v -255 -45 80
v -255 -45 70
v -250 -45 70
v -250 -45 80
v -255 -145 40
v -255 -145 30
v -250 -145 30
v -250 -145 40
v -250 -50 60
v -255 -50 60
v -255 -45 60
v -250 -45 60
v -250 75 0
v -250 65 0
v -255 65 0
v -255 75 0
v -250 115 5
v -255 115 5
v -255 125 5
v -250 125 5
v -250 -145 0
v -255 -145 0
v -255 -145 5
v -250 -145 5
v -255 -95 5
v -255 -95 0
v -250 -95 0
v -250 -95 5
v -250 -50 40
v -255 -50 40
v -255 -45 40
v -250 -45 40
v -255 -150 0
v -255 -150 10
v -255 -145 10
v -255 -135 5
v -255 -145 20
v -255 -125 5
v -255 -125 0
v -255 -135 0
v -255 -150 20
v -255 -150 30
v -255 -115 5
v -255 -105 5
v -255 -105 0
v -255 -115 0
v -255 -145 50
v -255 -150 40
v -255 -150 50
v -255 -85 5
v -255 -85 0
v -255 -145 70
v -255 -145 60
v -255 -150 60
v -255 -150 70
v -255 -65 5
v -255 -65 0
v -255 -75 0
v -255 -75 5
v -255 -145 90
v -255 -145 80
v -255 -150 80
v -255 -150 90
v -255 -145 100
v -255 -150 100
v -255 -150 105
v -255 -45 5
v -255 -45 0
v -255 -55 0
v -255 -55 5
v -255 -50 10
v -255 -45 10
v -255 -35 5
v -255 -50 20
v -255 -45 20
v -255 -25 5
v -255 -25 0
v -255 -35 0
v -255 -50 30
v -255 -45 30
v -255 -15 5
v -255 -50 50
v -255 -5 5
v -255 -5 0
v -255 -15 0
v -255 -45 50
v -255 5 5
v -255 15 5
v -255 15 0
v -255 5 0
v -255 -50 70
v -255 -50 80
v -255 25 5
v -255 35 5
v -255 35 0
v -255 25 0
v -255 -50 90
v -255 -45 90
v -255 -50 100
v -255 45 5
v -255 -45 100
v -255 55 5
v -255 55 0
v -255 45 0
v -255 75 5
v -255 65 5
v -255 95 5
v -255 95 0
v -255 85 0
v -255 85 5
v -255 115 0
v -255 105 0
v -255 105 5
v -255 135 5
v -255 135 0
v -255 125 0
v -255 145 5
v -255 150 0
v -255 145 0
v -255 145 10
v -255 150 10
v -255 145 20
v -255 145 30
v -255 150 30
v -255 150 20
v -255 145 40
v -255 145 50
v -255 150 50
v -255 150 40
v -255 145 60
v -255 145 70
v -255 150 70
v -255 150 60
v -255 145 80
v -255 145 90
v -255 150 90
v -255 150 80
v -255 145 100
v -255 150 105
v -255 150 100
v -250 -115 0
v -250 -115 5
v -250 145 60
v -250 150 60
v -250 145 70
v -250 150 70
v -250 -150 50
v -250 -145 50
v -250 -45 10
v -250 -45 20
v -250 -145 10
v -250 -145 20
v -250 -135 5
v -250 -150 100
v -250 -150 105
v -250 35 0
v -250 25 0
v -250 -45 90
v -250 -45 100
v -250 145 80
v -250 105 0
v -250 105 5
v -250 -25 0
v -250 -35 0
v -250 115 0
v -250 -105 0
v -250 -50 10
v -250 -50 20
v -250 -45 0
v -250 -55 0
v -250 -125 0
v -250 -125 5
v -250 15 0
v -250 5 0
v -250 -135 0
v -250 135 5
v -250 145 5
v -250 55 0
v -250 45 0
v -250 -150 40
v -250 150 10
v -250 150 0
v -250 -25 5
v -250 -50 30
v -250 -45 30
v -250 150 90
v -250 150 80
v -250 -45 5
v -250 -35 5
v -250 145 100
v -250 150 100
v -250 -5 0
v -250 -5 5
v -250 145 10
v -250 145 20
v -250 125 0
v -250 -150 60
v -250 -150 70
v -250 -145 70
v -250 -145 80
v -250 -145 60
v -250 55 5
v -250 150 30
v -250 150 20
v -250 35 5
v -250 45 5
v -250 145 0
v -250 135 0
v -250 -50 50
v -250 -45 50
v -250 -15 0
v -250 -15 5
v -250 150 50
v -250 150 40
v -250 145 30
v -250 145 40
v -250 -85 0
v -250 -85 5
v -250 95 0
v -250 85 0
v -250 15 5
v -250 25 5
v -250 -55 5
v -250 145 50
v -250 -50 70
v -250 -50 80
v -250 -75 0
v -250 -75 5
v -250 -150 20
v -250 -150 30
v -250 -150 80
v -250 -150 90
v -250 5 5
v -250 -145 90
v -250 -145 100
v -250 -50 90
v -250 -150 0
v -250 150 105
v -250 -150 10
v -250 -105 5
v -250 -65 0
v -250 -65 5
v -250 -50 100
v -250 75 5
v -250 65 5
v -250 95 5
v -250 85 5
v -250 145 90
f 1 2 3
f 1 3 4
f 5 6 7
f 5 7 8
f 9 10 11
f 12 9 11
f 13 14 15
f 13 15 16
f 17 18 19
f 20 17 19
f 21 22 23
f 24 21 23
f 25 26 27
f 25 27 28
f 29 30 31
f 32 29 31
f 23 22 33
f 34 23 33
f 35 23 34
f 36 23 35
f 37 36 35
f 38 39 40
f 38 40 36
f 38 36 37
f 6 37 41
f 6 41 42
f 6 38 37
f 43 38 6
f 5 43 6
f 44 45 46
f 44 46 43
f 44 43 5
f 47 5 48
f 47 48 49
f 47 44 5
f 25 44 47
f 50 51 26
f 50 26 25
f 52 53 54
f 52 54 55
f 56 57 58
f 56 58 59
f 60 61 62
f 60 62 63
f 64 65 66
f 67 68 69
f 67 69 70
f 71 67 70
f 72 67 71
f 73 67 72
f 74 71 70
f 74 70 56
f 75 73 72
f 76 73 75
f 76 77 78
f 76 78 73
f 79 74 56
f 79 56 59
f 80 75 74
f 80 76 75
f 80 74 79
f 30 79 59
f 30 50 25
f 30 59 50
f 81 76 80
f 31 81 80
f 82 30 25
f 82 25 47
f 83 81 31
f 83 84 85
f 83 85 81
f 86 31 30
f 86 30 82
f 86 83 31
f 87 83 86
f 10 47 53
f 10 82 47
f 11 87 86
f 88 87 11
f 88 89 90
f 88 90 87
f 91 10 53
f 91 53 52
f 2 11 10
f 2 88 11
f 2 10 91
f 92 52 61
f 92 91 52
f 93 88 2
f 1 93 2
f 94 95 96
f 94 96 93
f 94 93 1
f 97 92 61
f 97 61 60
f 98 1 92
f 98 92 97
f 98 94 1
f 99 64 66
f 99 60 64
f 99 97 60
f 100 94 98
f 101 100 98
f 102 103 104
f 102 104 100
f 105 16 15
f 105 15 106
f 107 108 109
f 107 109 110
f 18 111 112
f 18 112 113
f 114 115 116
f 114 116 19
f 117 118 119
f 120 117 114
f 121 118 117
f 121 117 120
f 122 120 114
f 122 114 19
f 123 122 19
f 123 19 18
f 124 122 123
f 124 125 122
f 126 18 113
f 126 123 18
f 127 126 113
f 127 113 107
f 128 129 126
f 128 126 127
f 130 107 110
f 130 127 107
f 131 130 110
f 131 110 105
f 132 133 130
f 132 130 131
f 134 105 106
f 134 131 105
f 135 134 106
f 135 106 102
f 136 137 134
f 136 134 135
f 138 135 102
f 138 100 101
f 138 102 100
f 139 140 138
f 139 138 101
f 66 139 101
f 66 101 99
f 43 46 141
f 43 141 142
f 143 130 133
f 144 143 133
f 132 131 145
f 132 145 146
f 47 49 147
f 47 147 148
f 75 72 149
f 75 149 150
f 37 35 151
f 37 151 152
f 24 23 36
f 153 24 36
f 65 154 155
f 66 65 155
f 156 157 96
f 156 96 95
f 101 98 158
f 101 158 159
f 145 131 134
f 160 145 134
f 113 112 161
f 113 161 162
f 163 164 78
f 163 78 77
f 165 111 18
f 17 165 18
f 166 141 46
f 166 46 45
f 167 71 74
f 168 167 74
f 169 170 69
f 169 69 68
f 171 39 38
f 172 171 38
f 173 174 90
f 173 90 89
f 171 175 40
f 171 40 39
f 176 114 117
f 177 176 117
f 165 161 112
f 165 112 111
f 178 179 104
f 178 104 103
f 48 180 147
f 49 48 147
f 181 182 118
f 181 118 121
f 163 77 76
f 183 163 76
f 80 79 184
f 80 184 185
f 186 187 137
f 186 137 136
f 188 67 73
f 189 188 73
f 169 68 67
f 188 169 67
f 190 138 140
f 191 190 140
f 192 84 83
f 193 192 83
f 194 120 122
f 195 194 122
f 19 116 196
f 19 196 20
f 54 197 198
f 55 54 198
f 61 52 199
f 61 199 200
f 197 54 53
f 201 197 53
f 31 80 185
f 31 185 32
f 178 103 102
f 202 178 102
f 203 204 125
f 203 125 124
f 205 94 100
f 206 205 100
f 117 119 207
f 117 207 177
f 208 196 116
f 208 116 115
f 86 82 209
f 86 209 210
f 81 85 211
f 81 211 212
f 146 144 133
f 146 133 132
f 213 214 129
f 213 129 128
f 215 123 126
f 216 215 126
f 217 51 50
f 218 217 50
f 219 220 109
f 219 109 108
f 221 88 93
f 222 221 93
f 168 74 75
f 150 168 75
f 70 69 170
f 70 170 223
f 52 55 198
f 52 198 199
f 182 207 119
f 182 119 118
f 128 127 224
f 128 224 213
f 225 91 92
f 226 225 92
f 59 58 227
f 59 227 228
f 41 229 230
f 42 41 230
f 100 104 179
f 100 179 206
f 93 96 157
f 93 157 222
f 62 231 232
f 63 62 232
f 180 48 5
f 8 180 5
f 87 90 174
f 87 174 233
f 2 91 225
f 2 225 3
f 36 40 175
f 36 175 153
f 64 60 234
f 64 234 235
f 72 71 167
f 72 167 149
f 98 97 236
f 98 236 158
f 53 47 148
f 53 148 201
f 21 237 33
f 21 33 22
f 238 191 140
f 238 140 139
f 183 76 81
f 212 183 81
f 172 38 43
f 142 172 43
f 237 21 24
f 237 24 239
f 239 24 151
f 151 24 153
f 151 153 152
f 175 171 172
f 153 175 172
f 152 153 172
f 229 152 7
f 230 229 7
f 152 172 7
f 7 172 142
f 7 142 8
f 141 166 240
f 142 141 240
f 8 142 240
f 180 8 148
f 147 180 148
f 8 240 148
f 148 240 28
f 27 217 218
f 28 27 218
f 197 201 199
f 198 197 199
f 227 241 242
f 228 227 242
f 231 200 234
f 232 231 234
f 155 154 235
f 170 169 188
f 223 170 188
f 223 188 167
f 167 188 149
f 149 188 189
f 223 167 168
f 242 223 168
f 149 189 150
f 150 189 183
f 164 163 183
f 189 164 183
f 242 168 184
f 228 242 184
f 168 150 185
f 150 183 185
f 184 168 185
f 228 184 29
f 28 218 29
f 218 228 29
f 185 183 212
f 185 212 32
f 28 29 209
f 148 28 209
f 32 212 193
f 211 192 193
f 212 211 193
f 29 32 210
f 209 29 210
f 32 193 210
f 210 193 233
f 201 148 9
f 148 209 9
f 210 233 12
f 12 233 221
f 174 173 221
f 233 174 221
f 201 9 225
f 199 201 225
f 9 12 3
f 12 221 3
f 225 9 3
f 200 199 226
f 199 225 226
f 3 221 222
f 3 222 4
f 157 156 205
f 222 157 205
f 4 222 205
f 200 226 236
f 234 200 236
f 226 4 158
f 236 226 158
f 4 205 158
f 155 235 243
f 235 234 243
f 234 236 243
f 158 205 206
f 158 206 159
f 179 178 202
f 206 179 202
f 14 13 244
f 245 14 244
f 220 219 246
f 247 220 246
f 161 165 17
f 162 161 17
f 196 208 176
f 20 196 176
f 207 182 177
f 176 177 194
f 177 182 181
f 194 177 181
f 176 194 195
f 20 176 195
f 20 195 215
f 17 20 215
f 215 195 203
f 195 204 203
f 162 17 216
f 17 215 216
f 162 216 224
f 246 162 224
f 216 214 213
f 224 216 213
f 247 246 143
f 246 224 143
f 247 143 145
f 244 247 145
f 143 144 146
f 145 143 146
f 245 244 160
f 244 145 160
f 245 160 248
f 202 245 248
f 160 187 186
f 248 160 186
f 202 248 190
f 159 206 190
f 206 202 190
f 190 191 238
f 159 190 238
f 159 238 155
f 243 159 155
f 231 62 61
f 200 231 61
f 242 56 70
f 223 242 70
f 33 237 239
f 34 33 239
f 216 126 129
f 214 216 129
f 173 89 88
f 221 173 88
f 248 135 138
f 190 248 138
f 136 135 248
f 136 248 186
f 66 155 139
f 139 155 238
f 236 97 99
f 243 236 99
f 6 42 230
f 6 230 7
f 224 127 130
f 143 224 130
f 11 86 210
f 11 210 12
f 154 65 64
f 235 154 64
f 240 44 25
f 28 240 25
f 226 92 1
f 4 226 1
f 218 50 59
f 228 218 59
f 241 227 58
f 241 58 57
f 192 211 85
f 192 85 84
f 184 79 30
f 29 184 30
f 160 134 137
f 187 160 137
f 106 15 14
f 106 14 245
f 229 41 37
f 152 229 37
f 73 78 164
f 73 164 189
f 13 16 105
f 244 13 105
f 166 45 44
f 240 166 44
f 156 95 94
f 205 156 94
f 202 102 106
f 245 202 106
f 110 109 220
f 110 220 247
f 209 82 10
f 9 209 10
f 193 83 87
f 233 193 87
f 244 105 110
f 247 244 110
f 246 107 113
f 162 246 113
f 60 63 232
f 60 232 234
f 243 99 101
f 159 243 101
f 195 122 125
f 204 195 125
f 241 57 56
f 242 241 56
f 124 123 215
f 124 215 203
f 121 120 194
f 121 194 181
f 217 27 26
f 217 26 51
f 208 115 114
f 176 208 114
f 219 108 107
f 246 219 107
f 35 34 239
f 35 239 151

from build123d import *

# Parameters (mm, degrees)
SKETCH004_W             = 105
SKETCH004_H             = 300
PAD004_DEPTH            = 5
SKETCH125_W             = 5
SKETCH125_H             = 10
POCKET035_DEPTH         = 5
LINEARPATTERN077_COUNT  = 15
LINEARPATTERN077_PITCH  = 20
SKETCH126_W             = 10
SKETCH126_H             = 5
POCKET036_DEPTH         = 5
LINEARPATTERN078_COUNT  = 5
LINEARPATTERN078_PITCH  = 20
BODY004_PLACEMENT_ANGLE = 90


with BuildPart() as part:
    # Sketch004 → Pad004 (new body)
    with BuildSketch(Plane.XY):
        Rectangle(SKETCH004_W, SKETCH004_H)
    extrude(amount=PAD004_DEPTH)

    # Sketch125 (on DatumPlane) → Pocket035 (cut)
    with BuildSketch(Plane.XY.offset(5)):
        with Locations((-50, 140)):
            Rectangle(SKETCH125_W, SKETCH125_H)
    pocket035 = extrude(amount=-POCKET035_DEPTH, mode=Mode.SUBTRACT)

    # LinearPattern077: Pocket035 ×15
    with Locations(*[(0, -i * LINEARPATTERN077_PITCH, 0) for i in range(1, LINEARPATTERN077_COUNT)]):
        add(pocket035, mode=Mode.SUBTRACT)

    # Sketch126 (on DatumPlane) → Pocket036 (cut)
    with BuildSketch(Plane.XY.offset(5)):
        with Locations((-37.5, 147.5)):
            Rectangle(SKETCH126_W, SKETCH126_H)
        with Locations((-37.5, -47.5)):
            Rectangle(SKETCH126_W, SKETCH126_H)
        with Locations((-37.5, -147.5)):
            Rectangle(SKETCH126_W, SKETCH126_H)
    pocket036 = extrude(amount=-POCKET036_DEPTH, mode=Mode.SUBTRACT)

    # LinearPattern078: Pocket036 ×5
    with Locations(*[(i * LINEARPATTERN078_PITCH, 0, 0) for i in range(1, LINEARPATTERN078_COUNT)]):
        add(pocket036, mode=Mode.SUBTRACT)


with BuildPart() as part_1:
    # Body004 placement: moved
    add(part.part.moved(Location((-250, 0, 52.5))).rotate(Axis((-250, 0, 52.5), (0, -1, 0)), BODY004_PLACEMENT_ANGLE))


solid = part_1.part
